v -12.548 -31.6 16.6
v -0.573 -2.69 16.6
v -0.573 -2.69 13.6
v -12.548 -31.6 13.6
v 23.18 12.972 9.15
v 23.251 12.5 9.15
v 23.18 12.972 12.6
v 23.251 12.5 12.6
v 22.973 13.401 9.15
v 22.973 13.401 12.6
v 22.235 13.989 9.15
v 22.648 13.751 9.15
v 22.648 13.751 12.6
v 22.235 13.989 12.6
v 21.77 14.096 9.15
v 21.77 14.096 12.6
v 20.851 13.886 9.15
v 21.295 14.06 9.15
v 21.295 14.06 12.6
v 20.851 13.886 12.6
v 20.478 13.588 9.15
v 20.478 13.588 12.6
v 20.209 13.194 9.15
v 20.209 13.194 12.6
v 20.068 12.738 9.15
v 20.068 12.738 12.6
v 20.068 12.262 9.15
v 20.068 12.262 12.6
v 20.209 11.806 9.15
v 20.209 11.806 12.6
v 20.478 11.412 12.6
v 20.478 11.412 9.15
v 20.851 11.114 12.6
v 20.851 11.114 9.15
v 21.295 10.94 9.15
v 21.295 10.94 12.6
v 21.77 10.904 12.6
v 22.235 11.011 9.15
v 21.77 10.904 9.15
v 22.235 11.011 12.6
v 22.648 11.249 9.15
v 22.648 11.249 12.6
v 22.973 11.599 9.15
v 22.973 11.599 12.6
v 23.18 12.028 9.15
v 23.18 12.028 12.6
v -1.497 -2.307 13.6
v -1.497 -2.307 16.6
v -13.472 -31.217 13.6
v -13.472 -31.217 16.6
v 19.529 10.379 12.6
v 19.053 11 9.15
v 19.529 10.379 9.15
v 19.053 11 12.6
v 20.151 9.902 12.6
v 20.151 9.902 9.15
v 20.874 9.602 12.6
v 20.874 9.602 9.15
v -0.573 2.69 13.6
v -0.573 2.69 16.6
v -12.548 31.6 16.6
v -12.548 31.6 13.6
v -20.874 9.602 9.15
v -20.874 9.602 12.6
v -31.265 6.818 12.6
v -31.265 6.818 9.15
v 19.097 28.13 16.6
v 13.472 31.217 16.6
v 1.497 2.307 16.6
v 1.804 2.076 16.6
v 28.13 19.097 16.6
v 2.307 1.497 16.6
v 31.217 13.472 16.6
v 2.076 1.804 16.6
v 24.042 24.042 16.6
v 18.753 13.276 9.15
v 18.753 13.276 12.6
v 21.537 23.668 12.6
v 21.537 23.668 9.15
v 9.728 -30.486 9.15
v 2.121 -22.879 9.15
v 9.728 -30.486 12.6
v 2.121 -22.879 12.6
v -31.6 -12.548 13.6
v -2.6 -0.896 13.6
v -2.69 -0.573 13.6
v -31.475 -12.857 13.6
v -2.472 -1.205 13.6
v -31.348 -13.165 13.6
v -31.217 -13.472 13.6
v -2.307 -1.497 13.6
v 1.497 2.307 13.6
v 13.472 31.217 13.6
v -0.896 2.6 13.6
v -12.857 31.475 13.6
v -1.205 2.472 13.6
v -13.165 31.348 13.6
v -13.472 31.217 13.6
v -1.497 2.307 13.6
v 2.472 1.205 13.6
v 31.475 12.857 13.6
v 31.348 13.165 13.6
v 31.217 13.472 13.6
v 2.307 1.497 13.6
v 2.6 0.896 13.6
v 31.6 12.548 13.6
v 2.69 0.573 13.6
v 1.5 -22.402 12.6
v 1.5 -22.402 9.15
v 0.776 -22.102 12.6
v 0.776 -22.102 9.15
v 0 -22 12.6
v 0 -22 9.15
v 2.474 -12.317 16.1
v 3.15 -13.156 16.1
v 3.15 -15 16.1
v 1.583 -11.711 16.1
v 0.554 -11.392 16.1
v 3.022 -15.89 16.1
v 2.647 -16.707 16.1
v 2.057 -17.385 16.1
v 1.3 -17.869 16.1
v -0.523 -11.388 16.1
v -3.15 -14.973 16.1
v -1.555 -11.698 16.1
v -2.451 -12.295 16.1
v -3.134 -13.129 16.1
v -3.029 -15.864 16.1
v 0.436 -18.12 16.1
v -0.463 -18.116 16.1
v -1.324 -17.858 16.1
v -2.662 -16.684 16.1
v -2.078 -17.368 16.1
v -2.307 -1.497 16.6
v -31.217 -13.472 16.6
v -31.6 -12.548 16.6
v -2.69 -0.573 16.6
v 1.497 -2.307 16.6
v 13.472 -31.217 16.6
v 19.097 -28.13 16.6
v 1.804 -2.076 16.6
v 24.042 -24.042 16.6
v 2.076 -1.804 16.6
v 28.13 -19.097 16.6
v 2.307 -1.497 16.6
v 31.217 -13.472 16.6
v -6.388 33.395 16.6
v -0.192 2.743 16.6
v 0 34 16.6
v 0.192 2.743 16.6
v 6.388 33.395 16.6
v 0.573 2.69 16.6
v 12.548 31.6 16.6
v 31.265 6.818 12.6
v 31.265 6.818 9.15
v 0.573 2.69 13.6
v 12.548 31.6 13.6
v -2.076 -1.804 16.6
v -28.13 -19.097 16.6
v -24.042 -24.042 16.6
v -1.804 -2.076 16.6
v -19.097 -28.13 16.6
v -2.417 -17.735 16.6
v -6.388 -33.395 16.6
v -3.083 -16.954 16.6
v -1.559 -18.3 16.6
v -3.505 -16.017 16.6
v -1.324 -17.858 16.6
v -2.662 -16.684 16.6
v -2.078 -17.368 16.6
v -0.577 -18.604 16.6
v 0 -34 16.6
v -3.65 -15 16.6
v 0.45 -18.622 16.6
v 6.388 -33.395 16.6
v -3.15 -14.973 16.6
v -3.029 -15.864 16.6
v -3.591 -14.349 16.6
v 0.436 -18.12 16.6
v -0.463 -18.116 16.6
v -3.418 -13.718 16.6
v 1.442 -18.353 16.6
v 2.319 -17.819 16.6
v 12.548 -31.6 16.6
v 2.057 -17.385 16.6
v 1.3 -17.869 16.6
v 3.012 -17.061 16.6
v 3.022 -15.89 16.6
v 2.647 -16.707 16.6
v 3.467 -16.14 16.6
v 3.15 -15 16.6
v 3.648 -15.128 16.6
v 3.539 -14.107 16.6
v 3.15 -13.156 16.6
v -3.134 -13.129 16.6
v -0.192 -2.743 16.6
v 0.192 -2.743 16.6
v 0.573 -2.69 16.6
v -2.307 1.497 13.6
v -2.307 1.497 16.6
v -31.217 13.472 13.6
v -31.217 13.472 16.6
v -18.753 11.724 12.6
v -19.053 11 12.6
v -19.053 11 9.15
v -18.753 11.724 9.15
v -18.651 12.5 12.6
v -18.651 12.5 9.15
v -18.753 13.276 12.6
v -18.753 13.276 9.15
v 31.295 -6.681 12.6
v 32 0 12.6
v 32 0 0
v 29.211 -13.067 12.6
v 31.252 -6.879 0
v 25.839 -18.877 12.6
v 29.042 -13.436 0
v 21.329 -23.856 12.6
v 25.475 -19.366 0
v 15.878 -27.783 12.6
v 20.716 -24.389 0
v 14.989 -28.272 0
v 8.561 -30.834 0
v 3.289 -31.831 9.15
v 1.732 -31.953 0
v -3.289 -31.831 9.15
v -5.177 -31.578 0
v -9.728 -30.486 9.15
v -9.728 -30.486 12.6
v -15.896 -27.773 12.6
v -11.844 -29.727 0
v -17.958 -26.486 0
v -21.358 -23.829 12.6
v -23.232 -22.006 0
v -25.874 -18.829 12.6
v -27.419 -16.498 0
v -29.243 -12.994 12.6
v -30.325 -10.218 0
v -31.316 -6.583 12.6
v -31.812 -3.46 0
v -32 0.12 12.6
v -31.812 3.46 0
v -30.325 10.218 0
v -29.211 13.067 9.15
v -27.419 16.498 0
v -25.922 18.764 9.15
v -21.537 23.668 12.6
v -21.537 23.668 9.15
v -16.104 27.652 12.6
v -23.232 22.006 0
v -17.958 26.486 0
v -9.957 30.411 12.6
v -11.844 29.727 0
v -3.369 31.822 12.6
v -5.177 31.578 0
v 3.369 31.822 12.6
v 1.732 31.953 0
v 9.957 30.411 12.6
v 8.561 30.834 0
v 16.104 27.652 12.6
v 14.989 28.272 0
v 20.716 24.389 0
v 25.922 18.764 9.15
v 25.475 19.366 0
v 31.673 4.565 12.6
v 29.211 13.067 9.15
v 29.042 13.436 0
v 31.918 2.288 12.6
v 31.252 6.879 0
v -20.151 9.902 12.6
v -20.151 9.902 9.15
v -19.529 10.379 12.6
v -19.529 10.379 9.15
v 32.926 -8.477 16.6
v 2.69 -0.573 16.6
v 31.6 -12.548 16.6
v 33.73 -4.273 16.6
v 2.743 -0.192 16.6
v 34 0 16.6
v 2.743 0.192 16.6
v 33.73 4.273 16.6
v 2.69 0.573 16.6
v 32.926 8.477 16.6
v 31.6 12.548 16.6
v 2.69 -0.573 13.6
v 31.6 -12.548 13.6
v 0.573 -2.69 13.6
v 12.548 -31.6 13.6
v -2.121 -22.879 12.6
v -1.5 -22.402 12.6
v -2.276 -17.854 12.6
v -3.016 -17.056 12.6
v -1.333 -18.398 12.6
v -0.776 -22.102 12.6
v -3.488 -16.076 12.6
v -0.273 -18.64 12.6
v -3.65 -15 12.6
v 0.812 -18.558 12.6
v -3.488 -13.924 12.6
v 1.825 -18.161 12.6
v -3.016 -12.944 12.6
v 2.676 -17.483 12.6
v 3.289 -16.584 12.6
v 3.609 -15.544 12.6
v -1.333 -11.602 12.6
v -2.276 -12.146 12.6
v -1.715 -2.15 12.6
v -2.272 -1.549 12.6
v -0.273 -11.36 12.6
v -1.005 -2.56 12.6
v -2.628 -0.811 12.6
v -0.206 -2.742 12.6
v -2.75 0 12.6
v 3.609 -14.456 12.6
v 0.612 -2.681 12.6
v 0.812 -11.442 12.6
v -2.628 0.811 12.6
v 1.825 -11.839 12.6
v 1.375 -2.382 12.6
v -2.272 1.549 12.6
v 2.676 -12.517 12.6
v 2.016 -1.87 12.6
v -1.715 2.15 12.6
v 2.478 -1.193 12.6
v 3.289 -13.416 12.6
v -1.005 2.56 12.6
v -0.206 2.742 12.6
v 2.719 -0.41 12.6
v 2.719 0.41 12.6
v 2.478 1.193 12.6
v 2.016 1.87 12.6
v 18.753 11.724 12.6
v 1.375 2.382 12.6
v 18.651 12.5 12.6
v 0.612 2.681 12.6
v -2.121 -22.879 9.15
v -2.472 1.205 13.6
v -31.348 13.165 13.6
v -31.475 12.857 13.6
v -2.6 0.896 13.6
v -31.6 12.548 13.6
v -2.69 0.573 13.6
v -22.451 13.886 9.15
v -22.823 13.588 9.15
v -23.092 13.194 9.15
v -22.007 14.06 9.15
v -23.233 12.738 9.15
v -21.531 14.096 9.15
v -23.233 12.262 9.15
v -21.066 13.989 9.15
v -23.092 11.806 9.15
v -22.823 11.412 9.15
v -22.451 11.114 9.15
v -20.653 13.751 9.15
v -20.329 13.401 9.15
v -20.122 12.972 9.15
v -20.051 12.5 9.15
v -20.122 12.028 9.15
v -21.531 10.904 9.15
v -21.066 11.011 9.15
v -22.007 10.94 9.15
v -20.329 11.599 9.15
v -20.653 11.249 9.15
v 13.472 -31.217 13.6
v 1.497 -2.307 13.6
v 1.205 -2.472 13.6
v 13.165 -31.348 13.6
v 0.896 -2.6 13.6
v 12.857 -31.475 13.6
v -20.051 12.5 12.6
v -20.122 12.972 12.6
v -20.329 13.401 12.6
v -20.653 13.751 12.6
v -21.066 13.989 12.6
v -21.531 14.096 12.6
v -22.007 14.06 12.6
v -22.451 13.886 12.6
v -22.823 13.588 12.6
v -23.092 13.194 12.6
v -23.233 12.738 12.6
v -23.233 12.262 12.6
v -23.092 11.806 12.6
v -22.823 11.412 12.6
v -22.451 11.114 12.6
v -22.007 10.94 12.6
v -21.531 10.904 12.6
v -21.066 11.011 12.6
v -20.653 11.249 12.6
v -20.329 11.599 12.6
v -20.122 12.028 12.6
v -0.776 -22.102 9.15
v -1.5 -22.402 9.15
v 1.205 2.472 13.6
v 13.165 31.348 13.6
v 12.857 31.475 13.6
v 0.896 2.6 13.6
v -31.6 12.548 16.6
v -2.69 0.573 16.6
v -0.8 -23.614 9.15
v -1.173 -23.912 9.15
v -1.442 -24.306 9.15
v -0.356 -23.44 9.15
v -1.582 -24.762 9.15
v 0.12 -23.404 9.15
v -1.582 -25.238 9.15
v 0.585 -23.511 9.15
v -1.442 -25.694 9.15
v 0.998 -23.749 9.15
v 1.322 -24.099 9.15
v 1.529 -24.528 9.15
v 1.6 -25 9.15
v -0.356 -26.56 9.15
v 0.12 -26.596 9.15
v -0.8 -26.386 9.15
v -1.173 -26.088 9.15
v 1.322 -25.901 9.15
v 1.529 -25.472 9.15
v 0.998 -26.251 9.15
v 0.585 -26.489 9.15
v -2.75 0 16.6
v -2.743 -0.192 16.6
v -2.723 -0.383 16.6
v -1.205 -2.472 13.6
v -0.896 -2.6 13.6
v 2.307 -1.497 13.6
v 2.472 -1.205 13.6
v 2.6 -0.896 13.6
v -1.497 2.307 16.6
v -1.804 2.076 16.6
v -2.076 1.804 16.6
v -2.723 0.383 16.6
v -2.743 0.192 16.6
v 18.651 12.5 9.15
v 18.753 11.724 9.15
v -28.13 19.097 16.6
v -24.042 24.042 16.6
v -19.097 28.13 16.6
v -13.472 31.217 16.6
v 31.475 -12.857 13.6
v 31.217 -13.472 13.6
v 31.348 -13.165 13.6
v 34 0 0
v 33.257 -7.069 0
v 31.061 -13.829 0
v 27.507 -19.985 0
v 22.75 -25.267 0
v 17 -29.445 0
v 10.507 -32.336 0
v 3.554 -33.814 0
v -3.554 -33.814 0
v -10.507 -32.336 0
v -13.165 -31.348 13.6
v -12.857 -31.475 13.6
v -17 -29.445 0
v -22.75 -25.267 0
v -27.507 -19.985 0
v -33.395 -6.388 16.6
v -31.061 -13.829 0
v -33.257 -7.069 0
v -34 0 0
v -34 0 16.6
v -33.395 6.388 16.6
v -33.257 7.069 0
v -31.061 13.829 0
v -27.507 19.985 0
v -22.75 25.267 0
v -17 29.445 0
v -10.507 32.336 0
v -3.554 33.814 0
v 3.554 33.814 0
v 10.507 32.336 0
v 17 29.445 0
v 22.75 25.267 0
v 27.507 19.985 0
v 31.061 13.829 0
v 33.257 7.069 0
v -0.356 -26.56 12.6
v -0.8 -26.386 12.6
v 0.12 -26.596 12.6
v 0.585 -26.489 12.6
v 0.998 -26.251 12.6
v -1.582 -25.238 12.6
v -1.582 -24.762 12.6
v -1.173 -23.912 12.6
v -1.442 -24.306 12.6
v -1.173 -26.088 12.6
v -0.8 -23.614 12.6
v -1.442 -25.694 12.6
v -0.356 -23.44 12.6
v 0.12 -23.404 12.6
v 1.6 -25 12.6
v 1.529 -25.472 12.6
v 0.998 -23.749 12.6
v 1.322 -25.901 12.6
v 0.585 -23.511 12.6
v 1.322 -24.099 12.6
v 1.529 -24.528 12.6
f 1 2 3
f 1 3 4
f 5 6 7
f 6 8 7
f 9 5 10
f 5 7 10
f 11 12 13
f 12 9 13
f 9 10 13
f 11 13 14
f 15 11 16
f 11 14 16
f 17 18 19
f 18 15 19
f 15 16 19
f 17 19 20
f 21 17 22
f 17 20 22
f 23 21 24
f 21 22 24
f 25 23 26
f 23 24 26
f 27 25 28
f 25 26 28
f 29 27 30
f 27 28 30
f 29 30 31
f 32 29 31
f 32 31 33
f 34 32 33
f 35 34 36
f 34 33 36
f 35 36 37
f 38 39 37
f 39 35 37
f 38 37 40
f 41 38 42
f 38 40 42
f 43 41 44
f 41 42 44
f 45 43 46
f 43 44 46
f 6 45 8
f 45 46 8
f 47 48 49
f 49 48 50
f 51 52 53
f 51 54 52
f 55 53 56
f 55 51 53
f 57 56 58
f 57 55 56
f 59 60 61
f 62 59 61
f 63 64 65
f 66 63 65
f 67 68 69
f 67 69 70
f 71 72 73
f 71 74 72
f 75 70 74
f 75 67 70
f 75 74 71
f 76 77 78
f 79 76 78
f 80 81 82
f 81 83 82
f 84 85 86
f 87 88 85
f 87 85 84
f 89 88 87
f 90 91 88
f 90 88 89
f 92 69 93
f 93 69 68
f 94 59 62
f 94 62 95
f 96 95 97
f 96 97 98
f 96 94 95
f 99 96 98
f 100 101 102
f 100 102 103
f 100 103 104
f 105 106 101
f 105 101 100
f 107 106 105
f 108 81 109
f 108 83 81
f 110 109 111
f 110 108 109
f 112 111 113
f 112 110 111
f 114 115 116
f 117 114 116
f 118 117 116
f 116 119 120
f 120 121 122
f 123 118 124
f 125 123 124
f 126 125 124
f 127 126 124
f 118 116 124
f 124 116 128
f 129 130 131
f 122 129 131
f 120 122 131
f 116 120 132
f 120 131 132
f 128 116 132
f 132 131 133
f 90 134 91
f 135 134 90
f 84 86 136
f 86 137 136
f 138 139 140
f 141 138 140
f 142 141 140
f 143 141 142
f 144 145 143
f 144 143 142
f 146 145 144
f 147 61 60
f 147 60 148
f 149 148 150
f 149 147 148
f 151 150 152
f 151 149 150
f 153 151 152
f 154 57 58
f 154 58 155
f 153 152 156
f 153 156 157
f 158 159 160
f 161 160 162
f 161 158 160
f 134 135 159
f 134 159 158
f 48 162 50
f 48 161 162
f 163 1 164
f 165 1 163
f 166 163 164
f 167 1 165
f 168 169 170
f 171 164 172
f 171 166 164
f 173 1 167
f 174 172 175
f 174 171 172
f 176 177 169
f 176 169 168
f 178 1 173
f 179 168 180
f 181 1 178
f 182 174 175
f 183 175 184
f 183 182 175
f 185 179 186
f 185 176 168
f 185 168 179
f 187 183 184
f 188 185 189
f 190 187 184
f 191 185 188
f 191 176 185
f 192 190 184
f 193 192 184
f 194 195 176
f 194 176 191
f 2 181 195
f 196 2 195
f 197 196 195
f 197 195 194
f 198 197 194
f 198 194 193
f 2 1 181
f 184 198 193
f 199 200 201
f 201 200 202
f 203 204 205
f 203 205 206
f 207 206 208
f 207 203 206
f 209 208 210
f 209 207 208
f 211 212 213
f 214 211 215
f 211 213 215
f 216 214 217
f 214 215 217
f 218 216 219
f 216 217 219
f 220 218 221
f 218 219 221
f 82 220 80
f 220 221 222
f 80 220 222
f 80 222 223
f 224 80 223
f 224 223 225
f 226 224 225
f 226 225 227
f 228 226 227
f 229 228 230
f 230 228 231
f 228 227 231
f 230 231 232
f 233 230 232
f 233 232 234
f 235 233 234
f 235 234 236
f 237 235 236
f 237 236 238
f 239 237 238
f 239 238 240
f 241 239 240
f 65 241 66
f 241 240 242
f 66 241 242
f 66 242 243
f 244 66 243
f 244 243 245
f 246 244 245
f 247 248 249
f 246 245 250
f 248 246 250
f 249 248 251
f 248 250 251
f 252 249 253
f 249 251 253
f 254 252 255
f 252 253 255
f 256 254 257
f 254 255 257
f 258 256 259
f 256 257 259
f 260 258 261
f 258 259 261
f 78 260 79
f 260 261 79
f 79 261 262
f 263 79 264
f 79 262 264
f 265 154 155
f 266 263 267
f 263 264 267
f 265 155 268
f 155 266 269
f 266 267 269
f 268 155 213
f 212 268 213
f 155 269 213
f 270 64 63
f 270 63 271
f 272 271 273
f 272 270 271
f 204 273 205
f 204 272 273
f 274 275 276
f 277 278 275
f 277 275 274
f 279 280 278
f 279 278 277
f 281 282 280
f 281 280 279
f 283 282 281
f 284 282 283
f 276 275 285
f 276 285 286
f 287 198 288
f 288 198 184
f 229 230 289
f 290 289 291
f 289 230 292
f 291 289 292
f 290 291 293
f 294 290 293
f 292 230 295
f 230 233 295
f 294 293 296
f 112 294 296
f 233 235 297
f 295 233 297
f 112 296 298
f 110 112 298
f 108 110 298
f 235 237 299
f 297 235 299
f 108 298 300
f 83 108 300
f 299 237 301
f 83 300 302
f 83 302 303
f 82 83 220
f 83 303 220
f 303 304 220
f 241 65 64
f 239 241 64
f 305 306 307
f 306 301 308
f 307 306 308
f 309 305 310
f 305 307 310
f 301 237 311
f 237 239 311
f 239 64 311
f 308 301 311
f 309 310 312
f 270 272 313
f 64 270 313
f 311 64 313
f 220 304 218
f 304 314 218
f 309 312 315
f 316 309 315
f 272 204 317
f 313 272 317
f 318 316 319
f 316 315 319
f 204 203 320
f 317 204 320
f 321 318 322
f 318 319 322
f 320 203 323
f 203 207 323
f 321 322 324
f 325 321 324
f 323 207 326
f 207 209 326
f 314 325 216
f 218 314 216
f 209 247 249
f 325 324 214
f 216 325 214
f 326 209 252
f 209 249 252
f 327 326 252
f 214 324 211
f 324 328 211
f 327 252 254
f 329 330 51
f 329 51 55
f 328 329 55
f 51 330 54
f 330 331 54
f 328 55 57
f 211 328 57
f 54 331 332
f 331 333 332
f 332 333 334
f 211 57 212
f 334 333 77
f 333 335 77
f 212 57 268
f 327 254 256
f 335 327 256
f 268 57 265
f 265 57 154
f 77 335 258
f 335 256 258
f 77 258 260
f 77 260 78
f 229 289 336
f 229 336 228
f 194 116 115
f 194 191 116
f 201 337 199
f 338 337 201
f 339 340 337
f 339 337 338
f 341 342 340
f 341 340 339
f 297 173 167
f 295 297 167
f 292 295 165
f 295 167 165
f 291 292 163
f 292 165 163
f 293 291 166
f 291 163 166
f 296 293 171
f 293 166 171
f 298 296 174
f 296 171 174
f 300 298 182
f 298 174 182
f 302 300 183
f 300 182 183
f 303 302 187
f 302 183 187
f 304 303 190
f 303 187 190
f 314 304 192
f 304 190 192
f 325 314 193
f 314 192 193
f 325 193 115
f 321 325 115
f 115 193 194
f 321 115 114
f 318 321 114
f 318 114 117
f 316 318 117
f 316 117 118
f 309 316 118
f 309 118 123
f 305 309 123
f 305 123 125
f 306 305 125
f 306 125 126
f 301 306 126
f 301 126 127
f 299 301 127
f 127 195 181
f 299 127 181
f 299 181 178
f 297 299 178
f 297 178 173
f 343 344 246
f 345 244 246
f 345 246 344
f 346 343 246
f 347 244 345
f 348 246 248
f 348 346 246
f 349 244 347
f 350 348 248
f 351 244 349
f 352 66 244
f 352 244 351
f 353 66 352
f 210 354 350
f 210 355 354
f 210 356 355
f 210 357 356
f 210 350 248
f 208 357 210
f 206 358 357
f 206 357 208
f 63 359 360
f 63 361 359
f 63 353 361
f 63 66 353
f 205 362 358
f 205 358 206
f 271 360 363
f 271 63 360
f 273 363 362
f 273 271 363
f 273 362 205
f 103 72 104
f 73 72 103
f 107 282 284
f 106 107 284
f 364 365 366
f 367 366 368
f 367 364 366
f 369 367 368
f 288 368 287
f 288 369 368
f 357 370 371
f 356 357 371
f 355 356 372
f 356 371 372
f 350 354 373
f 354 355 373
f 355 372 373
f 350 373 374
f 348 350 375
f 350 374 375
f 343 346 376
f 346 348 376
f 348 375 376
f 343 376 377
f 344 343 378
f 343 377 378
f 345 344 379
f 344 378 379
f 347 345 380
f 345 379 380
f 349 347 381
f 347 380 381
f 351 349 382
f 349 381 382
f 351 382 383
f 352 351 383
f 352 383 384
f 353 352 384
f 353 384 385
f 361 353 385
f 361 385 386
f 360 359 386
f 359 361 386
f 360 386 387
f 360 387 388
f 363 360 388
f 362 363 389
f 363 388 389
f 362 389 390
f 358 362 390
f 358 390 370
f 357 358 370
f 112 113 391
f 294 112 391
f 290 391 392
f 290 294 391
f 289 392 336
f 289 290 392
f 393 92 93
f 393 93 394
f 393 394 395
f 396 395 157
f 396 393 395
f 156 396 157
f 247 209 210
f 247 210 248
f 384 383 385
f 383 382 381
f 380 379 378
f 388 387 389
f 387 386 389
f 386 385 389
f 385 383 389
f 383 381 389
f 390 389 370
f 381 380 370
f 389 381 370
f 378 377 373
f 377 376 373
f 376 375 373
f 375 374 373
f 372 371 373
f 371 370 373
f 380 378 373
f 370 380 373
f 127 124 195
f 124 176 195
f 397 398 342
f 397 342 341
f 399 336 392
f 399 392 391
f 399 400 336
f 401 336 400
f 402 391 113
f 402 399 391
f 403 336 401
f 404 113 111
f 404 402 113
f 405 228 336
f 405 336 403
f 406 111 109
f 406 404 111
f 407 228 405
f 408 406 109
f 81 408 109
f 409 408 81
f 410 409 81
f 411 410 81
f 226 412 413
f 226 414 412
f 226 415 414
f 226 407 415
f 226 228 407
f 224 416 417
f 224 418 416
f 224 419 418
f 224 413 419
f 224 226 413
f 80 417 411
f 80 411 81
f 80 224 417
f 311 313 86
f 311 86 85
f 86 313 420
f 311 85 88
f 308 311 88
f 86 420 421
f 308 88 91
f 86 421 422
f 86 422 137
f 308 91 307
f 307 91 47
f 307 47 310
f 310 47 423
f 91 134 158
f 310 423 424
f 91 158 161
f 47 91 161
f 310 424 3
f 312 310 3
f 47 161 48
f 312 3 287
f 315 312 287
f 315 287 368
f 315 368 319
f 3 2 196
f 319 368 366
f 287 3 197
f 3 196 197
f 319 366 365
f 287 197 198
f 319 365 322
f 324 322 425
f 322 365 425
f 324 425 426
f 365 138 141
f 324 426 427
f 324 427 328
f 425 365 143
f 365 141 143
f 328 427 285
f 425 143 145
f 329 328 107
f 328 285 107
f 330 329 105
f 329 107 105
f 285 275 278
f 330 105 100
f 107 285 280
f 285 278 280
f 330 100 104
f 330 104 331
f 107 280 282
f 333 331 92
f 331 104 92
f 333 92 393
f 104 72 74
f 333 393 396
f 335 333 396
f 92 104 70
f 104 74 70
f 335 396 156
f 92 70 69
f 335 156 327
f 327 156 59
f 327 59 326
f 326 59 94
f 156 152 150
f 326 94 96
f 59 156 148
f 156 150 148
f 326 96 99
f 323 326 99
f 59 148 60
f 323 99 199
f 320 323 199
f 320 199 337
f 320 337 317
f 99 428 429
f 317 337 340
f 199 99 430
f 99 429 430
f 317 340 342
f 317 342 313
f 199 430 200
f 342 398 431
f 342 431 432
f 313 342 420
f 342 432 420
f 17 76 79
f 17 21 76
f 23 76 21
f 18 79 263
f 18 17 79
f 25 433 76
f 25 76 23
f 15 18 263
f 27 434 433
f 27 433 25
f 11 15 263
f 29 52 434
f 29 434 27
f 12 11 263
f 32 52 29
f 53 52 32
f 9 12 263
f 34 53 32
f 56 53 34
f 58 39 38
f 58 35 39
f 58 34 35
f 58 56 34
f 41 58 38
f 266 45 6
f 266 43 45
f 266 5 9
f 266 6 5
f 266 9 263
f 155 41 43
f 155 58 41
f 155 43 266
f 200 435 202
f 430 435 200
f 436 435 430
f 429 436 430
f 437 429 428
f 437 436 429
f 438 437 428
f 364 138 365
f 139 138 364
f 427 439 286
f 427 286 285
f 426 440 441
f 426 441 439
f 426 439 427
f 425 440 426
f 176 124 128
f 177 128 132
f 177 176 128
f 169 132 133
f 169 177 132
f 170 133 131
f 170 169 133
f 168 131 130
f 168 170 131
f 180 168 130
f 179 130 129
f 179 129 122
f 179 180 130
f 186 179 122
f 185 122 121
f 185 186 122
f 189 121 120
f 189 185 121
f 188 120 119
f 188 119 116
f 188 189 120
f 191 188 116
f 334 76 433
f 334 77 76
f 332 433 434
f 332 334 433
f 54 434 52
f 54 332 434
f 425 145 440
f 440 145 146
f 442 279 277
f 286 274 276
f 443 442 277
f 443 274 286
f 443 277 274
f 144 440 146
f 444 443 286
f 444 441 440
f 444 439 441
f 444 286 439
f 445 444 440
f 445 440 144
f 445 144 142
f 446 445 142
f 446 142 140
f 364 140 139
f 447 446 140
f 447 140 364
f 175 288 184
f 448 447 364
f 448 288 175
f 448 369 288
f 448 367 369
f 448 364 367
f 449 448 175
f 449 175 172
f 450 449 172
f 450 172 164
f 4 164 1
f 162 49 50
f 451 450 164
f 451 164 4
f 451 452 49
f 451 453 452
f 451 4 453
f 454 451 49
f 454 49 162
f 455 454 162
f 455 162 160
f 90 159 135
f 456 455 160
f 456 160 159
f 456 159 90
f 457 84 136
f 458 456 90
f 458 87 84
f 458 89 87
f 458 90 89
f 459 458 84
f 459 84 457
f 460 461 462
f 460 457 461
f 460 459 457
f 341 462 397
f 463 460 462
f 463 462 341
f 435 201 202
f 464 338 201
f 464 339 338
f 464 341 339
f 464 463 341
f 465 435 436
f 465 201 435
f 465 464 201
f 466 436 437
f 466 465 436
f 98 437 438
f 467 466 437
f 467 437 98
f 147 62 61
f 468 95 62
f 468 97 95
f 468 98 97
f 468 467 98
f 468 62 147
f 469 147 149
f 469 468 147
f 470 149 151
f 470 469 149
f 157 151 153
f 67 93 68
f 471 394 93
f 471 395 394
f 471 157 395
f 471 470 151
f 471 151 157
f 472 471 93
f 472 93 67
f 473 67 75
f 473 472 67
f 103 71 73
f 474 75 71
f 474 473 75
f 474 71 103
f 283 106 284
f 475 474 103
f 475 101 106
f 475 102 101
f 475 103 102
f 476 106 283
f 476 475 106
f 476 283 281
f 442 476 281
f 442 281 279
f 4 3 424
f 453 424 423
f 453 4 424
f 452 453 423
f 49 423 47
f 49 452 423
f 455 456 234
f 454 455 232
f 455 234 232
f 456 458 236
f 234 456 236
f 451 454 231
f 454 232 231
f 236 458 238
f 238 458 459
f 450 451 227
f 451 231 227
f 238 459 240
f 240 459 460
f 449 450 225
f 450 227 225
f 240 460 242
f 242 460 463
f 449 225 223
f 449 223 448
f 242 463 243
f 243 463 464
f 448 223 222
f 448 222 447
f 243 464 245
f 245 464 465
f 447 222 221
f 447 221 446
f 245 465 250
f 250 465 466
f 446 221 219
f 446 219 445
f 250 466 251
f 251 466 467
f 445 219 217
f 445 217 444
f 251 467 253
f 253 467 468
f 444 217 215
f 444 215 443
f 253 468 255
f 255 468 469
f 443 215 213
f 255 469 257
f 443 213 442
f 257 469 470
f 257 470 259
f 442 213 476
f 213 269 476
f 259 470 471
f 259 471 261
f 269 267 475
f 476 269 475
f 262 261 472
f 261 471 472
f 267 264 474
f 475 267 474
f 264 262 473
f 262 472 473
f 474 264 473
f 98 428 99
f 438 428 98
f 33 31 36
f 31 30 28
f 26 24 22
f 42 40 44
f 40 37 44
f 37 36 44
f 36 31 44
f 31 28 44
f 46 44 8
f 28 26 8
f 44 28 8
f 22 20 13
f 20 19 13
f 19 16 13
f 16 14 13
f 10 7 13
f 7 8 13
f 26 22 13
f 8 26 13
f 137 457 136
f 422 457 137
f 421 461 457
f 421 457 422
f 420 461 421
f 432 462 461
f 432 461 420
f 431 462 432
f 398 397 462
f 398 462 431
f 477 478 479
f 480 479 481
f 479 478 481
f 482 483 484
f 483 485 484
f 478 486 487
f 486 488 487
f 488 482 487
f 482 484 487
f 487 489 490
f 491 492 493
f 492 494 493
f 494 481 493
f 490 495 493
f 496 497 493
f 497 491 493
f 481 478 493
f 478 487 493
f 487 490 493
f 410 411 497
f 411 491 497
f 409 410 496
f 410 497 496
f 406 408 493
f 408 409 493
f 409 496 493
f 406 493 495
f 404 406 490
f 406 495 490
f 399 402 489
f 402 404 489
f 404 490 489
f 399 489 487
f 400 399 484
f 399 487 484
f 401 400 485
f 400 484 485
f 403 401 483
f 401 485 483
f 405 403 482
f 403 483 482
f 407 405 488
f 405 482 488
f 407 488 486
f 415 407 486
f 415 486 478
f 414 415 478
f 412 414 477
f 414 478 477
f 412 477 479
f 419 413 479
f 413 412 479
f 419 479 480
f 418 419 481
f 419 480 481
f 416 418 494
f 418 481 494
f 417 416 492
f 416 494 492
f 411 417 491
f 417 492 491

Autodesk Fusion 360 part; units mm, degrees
sketch "Sketch1" plane through (0, 0, 0) normal (0, 0, 1) x (1, 0, 0)
  circle A0 centre (0, 0) radius 30 construction
  circle A1 centre (0, 0) radius 32
  circle A2 centre (0, 0) radius 34
  dimension "d10" = 60
  dimension "d11" = 2
  dimension "d12" = 4
extrude "Extrude1" add sketch "Sketch1" along normal blind 16.6 contours A1 | A2
extrude "Extrude2" cut sketch "Sketch1" along normal blind 12.6 contours A1
sketch "Sketch2" plane through (0, 0, 16.6) normal (0, 0, 1) x (-1, 0, 0)
  circle A0 centre (0, 0) radius 34
  circle A1 centre (0, 0) radius 2.75
  line L0 (0, 0) -> (0, 15) construction
  circle A2 centre (0, 15) radius 3.65
  line L1 (0, 0) -> (-13.0112, 31.4119) construction
  line L2 (0, 0) -> (34, 0) construction
  line L3 (0.4619, 0.1913) -> (-12.5493, 31.6032)
  line L4 (-0.4619, -0.1913) -> (-13.4732, 31.2206)
  line L5 (0.5729, 2.6897) -> (12.5493, 31.6032)
  line L6 (1.4968, 2.307) -> (13.4732, 31.2206)
  line L7 (2.307, 1.4968) -> (31.2206, 13.4732)
  line L8 (2.6897, 0.5729) -> (31.6032, 12.5493)
  line L9 (2.6897, -0.5729) -> (31.6032, -12.5493)
  line L10 (2.307, -1.4968) -> (31.2206, -13.4732)
  line L11 (1.4968, -2.307) -> (13.4732, -31.2206)
  line L12 (0.5729, -2.6897) -> (12.5493, -31.6032)
  line L13 (-0.5729, -2.6897) -> (-12.5493, -31.6032)
  line L14 (-1.4968, -2.307) -> (-13.4732, -31.2206)
  line L15 (-2.307, -1.4968) -> (-31.2206, -13.4732)
  line L16 (-2.6897, -0.5729) -> (-31.6032, -12.5493)
  line L17 (-2.6897, 0.5729) -> (-31.6032, 12.5493)
  line L18 (-2.307, 1.4968) -> (-31.2206, 13.4732)
  circle A3 centre (0, 15) radius 3.15
  line L19 (3.1499, 14.9727) -> (3.1339, 13.1289)
  line L20 (-3.15, 15) -> (-3.15, 13.1561)
  dimension "d35" = 5.5
  dimension "d38" = 15
  dimension "d39" = 7.3
  dimension "d42" = 112.5
  dimension "d43" = 34
  dimension "d50" = 0.5
  dimension "d51" = -0.5
  dimension "d96" = -0.5
extrude "Extrude3" cut sketch "Sketch2" against normal blind 4 contours A1
extrude "Extrude4" cut sketch "Sketch2" against normal blind 4 contours A2 A3 L19 L20 | A2 A3 L19 L20 | A3
extrude "Extrude6" cut sketch "Sketch2" against normal blind 3 contours A0 A1 L7 L8 | A0 A1 L9 L10 | A0 A1 L5 L6 | A0 A1 L11 L12 | A0 A1 L3 L4 | A0 A1 L13 L14 | A0 A1 L17 L18 | A0 A1 L15 L16
extrude "Extrude7" add sketch "Sketch2" against normal blind 0.5 contours A2 A3 L19 L20 | A3 picked at (0.2428, 11.5318)
sketch "Sketch3" plane through (0, 0, 12.6) normal (0, 0, -1) x (1, 0, 0)
  circle A0 centre (0, 15) radius 3.65
  circle A1 centre (0, 0) radius 2.75
  circle A2 centre (0, 0) radius 32
  circle A3 centre (0, 0) radius 25 construction
  line L0 (0, 0) -> (0, 25) construction
  line L1 (0, 25) -> (0, 22) construction
  circle A4 centre (0, 25) radius 1.6
  arc A5 (0, 22) -> (2.1213, 22.8787) centre (0, 25) ccw
  line L2 (2.1213, 22.8787) -> (9.7281, 30.4855)
  line L3 (2.1213, 22.8787) -> (12.8789, 22.8787) construction
  line L4 (-2.1213, 22.8787) -> (-9.7281, 30.4855)
  arc A6 (-2.1213, 22.8787) -> (0, 22) centre (0, 25) ccw
  circle A7 centre (-21.6506, -12.5) radius 1.6
  line L5 (-20.8742, -9.6022) -> (-31.2652, -6.8179)
  arc A8 (-19.0526, -11) -> (-20.8742, -9.6022) centre (-21.6506, -12.5) ccw
  arc A9 (-18.7529, -13.2765) -> (-19.0526, -11) centre (-21.6506, -12.5) ccw
  line L6 (-18.7529, -13.2765) -> (-21.5371, -23.6675)
  circle A10 centre (21.6506, -12.5) radius 1.6
  line L7 (18.7529, -13.2765) -> (21.5371, -23.6675)
  arc A11 (19.0526, -11) -> (18.7529, -13.2765) centre (21.6506, -12.5) ccw
  arc A12 (20.8742, -9.6022) -> (19.0526, -11) centre (21.6506, -12.5) ccw
  line L8 (20.8742, -9.6022) -> (31.2652, -6.8179)
  dimension "d99" = -7
  dimension "d100" = 3
  dimension "d101" = 3.2
  dimension "d102" = 45
  dimension "d104" = 360
extrude "Extrude8" add sketch "Sketch3" along normal blind 3.45 contours A2 A5 L2 L4 A6 | A2 L7 A11 A12 L8 | A2 L5 A8 A9 L6
